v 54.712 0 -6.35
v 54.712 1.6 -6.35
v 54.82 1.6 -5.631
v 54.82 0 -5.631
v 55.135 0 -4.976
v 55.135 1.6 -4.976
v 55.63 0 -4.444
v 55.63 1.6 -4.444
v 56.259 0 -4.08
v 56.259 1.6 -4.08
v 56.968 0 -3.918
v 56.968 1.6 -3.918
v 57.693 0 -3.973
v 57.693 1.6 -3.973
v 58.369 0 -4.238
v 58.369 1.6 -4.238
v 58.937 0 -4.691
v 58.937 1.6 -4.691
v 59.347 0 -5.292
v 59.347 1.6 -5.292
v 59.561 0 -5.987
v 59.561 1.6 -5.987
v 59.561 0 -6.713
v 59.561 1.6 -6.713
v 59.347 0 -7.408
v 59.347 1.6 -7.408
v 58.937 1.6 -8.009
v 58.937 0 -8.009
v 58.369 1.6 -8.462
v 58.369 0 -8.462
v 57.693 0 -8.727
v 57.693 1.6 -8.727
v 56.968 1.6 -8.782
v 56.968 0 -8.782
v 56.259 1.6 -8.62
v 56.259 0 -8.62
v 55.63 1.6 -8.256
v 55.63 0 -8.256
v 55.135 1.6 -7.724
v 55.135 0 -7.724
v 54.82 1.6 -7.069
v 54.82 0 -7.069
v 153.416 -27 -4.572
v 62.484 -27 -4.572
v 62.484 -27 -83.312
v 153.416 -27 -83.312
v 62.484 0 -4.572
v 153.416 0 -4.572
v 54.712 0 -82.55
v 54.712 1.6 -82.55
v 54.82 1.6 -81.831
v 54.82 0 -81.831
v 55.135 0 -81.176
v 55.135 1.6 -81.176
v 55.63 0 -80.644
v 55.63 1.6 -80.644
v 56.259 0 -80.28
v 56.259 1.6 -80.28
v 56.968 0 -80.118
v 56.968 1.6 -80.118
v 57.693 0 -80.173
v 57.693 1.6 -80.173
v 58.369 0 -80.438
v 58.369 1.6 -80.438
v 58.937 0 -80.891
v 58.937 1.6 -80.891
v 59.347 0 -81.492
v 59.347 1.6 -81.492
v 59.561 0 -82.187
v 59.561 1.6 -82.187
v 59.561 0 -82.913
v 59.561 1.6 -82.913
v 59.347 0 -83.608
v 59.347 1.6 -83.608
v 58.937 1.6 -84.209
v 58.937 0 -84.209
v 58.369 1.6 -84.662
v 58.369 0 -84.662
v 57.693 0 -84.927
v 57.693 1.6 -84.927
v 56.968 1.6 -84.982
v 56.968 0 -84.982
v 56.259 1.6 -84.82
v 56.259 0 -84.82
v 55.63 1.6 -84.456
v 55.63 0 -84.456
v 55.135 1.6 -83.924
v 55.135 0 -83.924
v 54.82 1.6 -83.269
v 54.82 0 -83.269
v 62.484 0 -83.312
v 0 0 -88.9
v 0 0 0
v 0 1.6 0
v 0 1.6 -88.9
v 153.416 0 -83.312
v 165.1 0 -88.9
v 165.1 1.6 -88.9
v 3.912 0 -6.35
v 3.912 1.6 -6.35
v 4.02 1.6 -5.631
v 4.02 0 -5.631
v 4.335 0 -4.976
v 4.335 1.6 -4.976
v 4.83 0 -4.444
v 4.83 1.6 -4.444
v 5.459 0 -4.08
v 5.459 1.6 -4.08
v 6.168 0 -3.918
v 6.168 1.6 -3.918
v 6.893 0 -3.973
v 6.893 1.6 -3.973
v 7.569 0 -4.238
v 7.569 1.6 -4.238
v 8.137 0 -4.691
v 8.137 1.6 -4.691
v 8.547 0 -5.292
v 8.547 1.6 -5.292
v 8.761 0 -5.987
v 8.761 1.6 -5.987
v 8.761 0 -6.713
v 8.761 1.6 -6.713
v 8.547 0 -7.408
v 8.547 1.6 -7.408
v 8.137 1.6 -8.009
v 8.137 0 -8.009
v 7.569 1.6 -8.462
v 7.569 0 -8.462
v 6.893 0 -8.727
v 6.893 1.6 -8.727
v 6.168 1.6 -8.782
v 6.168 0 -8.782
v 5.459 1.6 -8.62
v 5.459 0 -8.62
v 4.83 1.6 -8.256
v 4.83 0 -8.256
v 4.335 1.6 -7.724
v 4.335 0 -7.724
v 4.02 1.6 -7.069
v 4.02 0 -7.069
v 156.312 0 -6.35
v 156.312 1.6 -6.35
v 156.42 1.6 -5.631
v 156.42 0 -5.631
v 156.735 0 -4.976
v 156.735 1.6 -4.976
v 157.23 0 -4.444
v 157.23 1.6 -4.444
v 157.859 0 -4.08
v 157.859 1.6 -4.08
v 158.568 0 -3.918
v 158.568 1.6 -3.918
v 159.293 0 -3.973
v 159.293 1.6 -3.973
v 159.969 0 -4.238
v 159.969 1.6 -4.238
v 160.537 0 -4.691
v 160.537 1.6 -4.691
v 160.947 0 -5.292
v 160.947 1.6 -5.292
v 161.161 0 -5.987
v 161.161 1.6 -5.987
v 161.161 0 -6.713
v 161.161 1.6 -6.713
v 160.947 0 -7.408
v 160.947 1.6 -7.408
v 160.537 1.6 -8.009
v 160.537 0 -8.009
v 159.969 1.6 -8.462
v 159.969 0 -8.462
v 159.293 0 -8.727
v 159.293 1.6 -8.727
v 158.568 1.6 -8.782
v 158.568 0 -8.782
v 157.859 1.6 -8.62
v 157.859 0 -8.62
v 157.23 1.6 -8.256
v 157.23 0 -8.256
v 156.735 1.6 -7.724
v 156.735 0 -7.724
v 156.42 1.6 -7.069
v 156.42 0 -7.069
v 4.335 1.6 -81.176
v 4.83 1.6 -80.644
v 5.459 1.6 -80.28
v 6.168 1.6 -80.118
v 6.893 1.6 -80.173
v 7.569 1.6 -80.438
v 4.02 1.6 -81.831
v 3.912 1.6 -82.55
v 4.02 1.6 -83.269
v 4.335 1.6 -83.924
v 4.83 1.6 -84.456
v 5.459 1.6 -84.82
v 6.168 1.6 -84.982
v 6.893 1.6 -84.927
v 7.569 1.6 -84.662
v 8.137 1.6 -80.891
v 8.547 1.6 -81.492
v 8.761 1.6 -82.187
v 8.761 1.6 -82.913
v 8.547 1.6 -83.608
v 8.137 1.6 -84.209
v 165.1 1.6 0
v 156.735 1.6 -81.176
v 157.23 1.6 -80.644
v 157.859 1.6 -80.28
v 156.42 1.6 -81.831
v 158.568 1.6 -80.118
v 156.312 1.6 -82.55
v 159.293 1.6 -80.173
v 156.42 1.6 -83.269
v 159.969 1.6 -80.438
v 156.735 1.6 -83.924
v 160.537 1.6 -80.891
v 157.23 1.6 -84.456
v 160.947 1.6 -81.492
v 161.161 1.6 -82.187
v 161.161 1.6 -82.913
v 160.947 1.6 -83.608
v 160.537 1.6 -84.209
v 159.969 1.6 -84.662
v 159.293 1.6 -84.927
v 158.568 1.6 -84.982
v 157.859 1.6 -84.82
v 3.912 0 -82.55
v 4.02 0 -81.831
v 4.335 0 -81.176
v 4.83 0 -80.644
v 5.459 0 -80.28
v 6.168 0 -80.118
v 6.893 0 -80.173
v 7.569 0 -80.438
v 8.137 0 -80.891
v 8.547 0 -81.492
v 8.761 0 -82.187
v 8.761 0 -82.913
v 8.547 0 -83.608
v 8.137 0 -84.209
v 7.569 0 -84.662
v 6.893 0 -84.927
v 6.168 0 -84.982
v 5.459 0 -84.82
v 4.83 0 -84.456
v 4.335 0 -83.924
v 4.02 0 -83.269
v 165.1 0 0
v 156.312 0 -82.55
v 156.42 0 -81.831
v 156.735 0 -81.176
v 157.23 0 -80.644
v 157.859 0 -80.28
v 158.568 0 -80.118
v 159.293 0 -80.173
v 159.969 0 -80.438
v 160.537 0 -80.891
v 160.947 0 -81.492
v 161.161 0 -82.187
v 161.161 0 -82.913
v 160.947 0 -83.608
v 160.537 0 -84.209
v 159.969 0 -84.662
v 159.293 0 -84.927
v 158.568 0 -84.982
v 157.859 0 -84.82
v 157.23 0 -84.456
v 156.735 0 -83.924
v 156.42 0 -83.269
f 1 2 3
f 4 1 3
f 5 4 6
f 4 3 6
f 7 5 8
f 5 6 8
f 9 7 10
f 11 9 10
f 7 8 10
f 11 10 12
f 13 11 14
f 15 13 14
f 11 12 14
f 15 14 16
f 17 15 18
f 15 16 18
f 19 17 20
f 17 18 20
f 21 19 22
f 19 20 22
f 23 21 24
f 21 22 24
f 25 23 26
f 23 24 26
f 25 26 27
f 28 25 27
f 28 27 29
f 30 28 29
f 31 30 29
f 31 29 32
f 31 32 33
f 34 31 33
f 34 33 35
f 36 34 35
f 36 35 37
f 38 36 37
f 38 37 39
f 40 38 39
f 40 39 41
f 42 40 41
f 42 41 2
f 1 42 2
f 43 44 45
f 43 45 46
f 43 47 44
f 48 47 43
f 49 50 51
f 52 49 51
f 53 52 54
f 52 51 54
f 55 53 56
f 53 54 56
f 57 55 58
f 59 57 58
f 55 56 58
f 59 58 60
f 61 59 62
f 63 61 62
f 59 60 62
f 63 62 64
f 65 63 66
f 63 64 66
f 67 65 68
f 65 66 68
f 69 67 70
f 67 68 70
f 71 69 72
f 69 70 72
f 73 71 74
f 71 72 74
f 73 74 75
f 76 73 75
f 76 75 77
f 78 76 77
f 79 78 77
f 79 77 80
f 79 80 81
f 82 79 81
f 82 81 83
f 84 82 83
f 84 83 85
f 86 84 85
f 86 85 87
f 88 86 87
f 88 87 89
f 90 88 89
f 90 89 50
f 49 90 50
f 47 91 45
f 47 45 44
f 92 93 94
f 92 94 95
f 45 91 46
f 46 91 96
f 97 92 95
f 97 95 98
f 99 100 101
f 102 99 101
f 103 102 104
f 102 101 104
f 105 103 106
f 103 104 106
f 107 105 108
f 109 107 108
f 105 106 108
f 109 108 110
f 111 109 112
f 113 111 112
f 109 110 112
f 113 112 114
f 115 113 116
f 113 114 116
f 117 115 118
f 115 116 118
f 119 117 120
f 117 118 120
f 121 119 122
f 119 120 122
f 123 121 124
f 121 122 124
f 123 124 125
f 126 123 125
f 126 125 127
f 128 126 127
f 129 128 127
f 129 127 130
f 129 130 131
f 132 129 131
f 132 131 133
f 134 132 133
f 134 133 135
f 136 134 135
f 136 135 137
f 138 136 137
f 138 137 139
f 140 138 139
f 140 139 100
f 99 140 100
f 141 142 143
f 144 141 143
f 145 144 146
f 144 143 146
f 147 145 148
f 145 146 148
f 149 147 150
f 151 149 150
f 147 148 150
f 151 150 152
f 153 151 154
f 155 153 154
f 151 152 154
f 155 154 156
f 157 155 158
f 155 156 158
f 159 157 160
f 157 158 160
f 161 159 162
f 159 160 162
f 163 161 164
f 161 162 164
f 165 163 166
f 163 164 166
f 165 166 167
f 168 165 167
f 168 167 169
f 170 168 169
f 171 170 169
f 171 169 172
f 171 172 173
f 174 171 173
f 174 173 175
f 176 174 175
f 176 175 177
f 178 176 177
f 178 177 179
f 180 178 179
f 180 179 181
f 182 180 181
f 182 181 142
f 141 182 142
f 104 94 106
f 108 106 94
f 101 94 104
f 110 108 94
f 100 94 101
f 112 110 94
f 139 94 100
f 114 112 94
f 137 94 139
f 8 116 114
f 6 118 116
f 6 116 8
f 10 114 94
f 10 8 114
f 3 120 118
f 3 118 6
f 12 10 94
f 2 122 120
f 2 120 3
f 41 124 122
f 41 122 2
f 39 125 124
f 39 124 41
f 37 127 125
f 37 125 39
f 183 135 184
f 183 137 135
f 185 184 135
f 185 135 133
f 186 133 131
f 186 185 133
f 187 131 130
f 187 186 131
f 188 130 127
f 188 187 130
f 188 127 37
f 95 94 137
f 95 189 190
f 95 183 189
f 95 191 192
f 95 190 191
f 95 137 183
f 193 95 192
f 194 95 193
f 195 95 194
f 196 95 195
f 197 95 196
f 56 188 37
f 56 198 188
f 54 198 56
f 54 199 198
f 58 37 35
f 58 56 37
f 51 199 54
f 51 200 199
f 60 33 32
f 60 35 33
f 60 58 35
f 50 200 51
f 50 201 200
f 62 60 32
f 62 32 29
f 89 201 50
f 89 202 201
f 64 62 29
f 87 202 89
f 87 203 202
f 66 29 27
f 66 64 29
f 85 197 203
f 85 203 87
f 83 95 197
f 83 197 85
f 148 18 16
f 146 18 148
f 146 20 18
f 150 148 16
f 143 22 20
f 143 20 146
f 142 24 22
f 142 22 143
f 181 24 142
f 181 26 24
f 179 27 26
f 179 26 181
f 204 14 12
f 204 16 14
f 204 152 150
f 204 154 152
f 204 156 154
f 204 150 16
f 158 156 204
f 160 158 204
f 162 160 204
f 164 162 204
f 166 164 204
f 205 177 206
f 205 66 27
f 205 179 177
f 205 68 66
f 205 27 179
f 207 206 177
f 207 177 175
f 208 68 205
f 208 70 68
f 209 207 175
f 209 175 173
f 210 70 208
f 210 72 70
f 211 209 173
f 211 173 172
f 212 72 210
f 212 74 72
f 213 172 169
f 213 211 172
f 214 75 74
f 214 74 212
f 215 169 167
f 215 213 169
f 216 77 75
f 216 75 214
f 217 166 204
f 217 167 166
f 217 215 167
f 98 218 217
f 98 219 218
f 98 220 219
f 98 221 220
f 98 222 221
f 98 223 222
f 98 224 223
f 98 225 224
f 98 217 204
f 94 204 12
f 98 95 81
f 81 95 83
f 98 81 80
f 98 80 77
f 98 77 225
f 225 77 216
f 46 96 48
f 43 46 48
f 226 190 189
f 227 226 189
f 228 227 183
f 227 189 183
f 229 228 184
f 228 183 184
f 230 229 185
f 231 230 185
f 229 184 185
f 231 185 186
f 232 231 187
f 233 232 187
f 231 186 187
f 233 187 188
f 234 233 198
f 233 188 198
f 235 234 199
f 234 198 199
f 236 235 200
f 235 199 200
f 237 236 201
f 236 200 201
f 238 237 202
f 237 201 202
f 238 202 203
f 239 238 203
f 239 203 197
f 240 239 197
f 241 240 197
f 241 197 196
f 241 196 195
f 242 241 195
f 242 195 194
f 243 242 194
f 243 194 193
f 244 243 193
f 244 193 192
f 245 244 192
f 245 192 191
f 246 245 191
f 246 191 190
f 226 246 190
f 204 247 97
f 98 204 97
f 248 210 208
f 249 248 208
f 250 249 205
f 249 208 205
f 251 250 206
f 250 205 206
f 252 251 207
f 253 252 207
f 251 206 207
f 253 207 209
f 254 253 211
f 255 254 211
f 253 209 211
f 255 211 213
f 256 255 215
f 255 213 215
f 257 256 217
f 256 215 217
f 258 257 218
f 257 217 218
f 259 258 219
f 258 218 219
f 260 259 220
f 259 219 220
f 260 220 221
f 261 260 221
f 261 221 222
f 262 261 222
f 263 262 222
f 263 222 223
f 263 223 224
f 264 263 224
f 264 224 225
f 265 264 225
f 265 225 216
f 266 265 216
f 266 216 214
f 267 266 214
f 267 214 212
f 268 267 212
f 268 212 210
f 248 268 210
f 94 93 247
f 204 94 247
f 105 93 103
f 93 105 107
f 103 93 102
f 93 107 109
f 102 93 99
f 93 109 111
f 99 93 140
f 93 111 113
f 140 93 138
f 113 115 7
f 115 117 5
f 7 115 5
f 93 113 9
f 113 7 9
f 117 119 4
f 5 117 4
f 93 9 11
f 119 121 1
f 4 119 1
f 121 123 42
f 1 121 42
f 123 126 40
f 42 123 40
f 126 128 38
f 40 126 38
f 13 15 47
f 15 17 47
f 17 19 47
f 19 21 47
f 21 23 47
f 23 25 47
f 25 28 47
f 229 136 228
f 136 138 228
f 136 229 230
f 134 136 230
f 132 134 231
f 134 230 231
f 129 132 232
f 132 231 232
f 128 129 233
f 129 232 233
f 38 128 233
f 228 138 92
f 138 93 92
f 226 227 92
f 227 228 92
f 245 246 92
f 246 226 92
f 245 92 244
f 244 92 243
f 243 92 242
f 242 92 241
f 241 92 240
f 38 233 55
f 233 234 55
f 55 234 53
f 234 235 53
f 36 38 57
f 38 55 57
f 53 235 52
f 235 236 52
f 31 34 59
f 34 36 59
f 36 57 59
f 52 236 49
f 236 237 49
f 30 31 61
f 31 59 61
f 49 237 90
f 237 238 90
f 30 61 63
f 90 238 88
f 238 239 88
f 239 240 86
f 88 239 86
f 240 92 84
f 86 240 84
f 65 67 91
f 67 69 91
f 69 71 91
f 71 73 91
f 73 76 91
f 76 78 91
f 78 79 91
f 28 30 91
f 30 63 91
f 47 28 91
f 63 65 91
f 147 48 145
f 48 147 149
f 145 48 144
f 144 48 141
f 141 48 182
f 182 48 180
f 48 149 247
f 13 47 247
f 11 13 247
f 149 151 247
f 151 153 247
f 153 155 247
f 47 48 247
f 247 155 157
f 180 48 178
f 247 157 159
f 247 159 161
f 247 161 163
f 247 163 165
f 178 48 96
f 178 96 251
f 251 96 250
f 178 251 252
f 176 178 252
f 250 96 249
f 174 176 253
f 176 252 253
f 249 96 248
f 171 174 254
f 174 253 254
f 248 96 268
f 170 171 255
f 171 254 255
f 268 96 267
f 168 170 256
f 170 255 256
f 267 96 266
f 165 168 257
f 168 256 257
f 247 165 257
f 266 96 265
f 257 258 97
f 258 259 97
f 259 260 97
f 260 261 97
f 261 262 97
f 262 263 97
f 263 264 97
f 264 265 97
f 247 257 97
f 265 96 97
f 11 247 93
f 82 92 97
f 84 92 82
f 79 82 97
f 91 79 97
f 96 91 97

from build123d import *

# Parameters (mm, degrees)
SKETCH1_W          = 165.1
SKETCH1_H          = 88.9
EXTRUDE1_DEPTH     = 1.6002
SKETCH2_R          = 2.4384
CUT_EXTRUDE1_DEPTH = 2.6002
SKETCH3_W          = 90.932
SKETCH3_H          = 78.74
EXTRUDE2_DEPTH     = 27.0002


with BuildPart() as part:
    # Sketch1 → Extrude1 (new body)
    with BuildSketch(Plane(origin=(0, 0, 0), x_dir=(1, 0, 0), z_dir=(0, 1, 0))):
        with Locations((82.55, 44.45)):
            Rectangle(SKETCH1_W, SKETCH1_H)
    extrude(amount=EXTRUDE1_DEPTH)

    # Sketch2 → Cut-Extrude1 (cut, through all)
    with BuildSketch(Plane(origin=(0, 1.6002, 0), x_dir=(-1, 0, 0), z_dir=(0, 1, 0))):
        with Locations((-158.75, -6.35)):
            Circle(SKETCH2_R)
        with Locations((-57.15, -6.35)):
            Circle(SKETCH2_R)
        with Locations((-6.35, -6.35)):
            Circle(SKETCH2_R)
        with Locations((-158.75, -82.55)):
            Circle(SKETCH2_R)
        with Locations((-57.15, -82.55)):
            Circle(SKETCH2_R)
        with Locations((-6.35, -82.55)):
            Circle(SKETCH2_R)
    extrude(amount=-CUT_EXTRUDE1_DEPTH, mode=Mode.SUBTRACT)

    # Sketch3 → Extrude2 (add)
    with BuildSketch(Plane.XZ):
        with Locations((107.95, -43.942)):
            Rectangle(SKETCH3_W, SKETCH3_H)
    extrude(amount=EXTRUDE2_DEPTH)


solid = part.part
